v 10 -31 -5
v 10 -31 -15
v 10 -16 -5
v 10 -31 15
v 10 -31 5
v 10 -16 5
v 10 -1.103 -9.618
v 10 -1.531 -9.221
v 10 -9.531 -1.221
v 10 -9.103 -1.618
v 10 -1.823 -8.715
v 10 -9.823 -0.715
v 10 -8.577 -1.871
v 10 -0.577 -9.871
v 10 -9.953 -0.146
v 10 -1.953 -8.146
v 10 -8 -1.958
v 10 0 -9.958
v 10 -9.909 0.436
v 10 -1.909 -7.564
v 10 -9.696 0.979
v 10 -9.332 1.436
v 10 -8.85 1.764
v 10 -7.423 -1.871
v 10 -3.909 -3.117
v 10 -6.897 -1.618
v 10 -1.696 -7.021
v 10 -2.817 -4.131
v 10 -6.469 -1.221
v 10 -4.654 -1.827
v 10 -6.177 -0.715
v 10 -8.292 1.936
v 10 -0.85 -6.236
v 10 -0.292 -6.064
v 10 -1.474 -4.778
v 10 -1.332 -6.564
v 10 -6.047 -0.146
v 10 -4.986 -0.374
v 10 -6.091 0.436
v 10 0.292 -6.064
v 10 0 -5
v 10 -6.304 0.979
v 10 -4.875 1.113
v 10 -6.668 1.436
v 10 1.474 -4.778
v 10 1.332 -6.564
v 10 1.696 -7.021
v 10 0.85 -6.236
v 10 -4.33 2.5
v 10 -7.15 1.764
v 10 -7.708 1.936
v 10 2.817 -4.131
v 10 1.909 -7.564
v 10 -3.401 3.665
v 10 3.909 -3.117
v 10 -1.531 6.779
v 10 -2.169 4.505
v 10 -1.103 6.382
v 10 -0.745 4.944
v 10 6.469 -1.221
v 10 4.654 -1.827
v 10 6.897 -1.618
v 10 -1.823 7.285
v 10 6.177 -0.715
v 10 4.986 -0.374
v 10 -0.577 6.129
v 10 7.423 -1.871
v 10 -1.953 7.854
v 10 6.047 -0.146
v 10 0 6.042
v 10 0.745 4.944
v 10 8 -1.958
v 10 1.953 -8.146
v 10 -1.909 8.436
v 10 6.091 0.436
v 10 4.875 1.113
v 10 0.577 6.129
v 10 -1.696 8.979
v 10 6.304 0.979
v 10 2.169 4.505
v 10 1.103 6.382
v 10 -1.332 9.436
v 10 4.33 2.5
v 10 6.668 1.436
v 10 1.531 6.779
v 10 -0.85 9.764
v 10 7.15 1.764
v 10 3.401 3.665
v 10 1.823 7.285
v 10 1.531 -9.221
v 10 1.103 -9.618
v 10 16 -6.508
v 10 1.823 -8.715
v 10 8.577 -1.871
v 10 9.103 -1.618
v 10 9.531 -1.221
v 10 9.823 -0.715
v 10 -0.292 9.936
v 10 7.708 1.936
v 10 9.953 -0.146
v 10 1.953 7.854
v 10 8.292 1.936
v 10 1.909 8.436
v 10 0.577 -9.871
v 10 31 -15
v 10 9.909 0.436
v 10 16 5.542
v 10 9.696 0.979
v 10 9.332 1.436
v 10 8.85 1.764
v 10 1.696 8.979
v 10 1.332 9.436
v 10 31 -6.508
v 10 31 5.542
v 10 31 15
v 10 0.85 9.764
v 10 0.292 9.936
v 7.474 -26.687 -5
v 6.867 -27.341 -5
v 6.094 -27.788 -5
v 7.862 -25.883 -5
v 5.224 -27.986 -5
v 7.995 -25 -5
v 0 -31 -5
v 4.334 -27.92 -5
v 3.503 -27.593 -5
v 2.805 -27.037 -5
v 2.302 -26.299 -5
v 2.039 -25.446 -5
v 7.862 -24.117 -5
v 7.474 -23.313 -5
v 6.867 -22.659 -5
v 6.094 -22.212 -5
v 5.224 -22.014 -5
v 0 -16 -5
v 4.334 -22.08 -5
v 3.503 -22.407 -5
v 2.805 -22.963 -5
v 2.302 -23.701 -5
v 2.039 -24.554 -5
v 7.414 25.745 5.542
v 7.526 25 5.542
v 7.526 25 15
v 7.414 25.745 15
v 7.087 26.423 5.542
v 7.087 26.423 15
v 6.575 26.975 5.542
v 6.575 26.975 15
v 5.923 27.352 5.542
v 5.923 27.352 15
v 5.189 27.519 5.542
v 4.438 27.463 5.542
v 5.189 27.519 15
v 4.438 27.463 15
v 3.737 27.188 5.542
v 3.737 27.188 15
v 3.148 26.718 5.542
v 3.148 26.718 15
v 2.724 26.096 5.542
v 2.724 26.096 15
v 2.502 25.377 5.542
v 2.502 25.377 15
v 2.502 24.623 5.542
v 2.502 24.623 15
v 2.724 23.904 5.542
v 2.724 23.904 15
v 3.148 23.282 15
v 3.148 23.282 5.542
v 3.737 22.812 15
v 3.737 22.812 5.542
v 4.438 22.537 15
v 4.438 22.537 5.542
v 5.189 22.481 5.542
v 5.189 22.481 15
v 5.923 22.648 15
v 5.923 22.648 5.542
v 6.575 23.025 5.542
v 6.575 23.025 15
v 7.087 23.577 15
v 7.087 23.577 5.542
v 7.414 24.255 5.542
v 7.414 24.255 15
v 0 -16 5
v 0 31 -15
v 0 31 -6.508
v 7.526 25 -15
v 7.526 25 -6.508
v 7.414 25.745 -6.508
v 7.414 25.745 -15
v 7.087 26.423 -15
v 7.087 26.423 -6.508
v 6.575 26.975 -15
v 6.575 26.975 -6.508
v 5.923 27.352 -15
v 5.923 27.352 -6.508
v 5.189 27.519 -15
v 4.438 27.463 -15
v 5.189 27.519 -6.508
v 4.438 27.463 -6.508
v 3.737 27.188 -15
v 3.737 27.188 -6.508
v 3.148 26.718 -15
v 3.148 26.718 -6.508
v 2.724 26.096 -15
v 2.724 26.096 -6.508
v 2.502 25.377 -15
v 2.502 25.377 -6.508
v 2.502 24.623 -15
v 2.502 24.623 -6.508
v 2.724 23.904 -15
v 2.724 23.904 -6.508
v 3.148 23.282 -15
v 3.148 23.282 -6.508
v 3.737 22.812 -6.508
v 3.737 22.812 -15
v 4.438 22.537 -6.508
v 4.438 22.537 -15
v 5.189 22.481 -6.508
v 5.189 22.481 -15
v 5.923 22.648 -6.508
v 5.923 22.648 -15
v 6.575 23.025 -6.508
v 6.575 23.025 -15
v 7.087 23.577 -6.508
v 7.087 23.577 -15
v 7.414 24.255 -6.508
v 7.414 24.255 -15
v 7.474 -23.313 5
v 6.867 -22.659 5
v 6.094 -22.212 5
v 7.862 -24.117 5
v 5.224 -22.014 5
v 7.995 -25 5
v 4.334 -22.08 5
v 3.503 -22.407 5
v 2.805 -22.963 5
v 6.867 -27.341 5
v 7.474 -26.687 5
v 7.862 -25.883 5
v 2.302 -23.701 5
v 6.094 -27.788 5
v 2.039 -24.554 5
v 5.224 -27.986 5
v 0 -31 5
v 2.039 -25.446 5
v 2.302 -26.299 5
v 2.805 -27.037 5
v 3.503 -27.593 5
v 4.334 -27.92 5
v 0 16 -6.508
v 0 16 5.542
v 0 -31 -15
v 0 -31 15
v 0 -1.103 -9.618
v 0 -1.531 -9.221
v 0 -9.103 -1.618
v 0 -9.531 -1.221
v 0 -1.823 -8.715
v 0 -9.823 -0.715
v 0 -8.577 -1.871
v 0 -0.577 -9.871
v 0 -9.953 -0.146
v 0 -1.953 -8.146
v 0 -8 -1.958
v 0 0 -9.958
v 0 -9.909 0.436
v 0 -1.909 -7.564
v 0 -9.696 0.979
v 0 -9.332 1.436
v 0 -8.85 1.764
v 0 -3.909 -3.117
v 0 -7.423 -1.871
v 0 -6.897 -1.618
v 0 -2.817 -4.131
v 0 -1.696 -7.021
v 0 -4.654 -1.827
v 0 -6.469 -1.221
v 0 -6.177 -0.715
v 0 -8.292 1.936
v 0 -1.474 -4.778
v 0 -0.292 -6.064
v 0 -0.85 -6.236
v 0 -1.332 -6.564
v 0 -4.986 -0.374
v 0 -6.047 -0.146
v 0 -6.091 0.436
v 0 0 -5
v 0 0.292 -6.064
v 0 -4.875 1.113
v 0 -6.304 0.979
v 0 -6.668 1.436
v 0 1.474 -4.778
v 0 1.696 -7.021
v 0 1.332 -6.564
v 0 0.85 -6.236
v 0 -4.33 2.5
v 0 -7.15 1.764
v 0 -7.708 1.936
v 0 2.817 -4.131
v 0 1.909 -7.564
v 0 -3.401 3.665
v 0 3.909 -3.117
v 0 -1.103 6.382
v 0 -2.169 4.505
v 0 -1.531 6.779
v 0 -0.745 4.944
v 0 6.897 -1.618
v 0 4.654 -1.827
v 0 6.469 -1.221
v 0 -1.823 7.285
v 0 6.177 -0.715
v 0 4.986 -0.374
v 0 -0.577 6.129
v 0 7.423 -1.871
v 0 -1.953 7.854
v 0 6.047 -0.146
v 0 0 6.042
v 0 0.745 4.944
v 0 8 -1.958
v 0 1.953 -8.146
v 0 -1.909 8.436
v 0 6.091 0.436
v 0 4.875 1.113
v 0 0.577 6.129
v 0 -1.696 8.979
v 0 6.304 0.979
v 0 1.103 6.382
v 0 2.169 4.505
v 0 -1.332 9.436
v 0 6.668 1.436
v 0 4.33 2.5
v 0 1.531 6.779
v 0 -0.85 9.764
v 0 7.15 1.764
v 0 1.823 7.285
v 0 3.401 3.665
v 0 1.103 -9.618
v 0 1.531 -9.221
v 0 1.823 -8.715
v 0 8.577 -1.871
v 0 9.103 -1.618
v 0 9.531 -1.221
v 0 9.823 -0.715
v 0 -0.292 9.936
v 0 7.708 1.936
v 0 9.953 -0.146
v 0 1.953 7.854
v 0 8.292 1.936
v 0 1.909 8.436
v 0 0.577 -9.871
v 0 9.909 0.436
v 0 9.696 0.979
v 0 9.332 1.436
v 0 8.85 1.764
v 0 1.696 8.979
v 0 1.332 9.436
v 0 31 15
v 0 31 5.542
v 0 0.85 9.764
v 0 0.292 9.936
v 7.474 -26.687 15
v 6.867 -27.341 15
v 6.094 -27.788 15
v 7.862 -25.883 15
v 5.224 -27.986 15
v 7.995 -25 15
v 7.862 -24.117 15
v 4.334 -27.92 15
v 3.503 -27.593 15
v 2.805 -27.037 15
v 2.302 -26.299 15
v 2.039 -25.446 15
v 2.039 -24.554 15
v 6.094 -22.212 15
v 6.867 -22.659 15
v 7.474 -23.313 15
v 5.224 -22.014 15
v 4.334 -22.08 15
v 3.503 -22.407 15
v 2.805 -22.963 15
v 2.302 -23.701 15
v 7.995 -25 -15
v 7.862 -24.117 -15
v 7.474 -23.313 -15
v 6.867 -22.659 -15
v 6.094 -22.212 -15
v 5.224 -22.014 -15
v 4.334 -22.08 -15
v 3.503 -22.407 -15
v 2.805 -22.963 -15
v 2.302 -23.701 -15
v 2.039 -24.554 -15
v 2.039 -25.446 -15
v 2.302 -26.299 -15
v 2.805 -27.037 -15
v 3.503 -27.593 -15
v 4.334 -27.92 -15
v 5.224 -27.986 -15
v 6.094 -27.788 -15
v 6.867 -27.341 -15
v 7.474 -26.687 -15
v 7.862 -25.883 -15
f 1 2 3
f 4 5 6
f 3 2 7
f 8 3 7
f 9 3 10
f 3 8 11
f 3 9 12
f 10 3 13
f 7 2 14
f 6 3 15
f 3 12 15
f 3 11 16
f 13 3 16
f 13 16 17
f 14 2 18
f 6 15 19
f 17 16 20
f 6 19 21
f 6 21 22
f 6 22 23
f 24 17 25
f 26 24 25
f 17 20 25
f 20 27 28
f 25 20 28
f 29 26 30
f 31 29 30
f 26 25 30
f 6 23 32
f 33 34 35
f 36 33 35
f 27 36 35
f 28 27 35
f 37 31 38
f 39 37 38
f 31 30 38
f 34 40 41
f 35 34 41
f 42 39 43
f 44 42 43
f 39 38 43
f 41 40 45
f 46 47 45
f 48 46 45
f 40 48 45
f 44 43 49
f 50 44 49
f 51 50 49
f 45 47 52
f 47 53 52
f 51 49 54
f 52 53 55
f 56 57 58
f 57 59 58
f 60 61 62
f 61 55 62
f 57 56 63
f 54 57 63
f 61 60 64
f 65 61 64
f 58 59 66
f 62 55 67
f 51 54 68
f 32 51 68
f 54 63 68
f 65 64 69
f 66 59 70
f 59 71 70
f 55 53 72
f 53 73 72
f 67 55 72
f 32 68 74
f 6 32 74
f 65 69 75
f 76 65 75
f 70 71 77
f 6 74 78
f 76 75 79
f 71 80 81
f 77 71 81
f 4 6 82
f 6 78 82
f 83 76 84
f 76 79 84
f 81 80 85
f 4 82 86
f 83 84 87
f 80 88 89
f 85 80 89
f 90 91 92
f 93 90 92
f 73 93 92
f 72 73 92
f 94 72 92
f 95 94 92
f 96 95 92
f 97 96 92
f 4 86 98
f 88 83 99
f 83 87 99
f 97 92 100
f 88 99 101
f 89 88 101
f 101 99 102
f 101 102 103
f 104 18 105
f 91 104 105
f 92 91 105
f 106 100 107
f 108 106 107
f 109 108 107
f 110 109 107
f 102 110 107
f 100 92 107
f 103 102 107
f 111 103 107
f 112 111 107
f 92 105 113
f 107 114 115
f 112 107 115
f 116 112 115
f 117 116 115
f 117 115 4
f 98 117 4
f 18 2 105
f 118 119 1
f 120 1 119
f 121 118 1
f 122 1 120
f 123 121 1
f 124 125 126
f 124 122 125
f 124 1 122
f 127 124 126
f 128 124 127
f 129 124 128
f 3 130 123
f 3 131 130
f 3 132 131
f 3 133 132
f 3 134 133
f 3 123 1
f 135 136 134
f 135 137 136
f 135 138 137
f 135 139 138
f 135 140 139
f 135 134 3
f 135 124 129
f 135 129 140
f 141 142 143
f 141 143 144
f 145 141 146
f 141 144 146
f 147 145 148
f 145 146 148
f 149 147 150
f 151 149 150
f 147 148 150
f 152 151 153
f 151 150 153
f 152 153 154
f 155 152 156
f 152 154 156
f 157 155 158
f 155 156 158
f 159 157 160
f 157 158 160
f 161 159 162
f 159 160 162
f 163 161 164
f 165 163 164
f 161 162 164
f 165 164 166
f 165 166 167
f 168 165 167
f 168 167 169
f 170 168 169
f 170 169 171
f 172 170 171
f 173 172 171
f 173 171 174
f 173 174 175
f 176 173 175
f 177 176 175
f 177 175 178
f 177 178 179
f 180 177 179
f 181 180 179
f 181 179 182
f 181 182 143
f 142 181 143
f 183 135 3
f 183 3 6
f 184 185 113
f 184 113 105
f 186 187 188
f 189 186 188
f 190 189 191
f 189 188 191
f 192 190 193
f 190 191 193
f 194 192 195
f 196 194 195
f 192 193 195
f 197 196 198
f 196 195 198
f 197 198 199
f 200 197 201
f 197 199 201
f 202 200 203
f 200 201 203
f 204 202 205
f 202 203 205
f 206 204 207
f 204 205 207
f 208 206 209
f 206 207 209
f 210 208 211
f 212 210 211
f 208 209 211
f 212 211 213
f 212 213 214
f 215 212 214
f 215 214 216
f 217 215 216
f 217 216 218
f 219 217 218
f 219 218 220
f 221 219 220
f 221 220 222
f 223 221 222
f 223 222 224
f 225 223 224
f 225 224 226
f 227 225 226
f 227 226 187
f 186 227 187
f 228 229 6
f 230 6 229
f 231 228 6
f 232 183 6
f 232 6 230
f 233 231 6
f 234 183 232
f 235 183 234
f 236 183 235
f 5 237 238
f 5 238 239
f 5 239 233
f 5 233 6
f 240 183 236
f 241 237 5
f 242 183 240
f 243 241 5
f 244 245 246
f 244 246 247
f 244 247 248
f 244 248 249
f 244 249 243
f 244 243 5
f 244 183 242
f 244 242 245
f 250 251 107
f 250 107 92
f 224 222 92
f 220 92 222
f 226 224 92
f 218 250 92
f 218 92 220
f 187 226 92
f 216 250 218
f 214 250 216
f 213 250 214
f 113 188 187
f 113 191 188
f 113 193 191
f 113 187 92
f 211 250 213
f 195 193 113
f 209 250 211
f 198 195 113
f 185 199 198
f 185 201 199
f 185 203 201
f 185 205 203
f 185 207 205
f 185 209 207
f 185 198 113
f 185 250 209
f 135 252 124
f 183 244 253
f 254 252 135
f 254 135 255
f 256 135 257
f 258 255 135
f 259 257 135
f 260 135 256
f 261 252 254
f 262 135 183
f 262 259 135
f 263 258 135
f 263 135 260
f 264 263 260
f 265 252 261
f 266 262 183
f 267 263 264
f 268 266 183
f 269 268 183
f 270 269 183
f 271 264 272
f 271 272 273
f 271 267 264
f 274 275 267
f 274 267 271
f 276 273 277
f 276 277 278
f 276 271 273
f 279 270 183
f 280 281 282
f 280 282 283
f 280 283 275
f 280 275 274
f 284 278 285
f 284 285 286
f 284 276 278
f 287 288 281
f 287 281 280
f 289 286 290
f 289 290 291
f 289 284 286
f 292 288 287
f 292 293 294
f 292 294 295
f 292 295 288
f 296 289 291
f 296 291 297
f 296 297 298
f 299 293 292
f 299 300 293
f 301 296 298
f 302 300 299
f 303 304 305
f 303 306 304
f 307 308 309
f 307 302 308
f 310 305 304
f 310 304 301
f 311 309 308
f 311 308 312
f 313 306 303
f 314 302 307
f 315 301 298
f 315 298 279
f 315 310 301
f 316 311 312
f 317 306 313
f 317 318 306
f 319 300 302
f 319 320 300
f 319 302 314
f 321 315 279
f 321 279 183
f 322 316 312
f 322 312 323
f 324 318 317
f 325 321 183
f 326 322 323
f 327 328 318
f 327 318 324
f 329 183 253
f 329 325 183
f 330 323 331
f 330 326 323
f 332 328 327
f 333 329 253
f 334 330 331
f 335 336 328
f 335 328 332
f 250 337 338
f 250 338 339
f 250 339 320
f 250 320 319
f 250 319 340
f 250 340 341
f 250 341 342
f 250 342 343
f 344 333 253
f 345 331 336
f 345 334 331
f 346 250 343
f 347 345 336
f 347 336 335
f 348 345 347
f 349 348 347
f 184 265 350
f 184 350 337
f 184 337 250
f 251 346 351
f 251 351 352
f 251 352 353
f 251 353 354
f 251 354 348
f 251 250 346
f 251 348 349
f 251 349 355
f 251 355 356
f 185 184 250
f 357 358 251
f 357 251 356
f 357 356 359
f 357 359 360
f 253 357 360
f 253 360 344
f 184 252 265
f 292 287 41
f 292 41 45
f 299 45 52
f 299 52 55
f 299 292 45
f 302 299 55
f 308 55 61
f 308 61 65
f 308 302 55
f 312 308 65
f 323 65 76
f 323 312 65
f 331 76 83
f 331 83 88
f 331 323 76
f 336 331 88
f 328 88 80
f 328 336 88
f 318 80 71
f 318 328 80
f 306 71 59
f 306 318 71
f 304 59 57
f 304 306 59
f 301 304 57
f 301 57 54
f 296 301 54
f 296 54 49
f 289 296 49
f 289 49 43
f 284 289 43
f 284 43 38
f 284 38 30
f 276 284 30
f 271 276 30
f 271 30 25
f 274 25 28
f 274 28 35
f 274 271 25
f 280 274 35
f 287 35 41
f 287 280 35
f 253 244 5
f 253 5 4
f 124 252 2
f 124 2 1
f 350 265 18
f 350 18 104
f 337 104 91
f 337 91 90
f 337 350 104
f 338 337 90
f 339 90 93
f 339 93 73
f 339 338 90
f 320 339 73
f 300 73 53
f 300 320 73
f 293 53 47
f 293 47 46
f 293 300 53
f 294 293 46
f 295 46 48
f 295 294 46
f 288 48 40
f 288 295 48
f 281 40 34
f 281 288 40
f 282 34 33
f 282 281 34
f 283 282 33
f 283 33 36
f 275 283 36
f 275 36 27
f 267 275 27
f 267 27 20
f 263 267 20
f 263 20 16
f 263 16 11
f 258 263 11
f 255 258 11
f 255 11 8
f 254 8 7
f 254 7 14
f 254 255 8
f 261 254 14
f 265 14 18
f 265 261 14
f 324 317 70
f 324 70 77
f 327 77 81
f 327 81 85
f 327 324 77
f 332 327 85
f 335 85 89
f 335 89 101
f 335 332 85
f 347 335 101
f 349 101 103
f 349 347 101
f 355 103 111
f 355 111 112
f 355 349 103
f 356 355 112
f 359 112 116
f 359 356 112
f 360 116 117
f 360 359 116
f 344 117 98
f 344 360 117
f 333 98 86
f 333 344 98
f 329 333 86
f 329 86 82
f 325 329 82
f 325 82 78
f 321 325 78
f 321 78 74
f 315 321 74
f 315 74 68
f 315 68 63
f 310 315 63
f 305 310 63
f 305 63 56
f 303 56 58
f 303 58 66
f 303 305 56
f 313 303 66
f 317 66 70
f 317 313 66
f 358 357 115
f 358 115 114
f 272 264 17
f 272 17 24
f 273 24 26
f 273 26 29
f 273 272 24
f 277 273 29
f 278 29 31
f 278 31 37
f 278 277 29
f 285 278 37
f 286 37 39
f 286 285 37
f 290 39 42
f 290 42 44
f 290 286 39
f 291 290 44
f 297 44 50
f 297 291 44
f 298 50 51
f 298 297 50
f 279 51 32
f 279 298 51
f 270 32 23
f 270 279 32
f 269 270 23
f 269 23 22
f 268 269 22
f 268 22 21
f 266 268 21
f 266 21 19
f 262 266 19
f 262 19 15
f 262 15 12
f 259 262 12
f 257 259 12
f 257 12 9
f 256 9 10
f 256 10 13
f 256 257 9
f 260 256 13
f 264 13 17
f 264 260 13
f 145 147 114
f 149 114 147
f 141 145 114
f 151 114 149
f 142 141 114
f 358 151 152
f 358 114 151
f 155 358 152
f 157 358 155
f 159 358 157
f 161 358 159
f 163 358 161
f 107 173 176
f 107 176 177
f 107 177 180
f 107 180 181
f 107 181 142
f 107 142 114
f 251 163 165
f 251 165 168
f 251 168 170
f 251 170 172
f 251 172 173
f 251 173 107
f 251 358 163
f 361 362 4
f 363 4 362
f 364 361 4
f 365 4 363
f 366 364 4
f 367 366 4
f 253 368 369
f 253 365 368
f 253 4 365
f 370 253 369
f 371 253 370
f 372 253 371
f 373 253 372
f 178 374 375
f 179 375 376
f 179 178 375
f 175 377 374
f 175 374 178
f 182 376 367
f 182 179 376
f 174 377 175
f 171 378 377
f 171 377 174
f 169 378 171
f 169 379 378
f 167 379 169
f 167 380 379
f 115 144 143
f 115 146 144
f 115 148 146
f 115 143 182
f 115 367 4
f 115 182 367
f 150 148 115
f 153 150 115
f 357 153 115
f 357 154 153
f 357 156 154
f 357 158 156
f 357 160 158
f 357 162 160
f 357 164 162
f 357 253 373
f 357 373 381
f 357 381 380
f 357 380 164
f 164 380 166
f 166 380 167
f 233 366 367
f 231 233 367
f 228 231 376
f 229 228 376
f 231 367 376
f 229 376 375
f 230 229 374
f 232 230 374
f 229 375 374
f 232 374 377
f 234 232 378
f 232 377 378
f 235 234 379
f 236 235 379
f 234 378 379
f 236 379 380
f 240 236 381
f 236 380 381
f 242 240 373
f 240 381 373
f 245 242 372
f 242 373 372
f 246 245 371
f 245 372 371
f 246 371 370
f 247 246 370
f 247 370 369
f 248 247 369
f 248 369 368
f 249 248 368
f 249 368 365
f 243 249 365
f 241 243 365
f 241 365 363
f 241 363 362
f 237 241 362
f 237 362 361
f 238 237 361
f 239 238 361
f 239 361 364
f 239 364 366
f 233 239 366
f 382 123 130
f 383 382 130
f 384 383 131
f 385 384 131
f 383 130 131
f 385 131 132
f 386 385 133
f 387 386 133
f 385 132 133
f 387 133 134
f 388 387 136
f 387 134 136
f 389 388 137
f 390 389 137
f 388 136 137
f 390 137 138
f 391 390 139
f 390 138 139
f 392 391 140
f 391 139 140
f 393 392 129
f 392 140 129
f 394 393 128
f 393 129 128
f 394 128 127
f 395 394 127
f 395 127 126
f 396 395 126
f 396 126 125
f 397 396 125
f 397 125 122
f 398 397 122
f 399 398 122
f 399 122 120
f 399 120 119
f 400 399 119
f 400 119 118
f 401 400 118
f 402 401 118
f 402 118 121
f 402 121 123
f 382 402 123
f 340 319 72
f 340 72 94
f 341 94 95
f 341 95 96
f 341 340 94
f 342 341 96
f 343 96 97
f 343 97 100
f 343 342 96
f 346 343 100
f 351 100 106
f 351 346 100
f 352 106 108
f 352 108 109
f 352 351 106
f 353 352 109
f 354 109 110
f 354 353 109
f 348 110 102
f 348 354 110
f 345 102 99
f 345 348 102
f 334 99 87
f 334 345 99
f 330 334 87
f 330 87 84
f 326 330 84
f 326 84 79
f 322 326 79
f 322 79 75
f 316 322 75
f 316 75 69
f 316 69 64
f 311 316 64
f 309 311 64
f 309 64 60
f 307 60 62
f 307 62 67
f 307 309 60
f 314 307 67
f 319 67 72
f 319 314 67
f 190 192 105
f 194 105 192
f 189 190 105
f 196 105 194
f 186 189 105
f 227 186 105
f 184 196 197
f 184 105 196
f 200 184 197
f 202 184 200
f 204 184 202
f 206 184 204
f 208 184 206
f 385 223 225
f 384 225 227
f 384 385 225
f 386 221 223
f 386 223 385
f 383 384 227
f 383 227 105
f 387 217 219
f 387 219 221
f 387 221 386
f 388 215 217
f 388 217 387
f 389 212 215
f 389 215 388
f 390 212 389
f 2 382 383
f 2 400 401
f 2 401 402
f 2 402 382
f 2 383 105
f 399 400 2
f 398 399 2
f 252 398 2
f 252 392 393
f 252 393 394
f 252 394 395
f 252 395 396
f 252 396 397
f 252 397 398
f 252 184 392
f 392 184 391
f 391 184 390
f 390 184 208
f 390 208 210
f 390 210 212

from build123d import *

# Parameters (mm, degrees)
CROQUIS1_R              = 5
CROQUIS1_R_2            = 1.95828143
SALIENTE_EXTRUIR1_DEPTH = 10
CROQUIS2_R              = 2.526447491
CROQUIS2_R_2            = 2.994638929
CORTAR_EXTRUIR1_DEPTH   = 45.283179651


with BuildPart() as part:
    # Croquis1 → Saliente-Extruir1 (new body)
    with BuildSketch(Plane(origin=(0, 0, 0), x_dir=(0, 0, -1), z_dir=(1, 0, 0))):
        Polygon((15, -31), (5, -31), (5, -16), (-5, -16), (-5, -31), (-15, -31), (-15, 31), (-5.542055275, 31), (-5.542055275, 16), (6.50834207, 16), (6.50834207, 31), (15, 31), align=None)
        Circle(CROQUIS1_R, mode=Mode.SUBTRACT)
        with Locations((-8, 0)):
            Circle(CROQUIS1_R_2, mode=Mode.SUBTRACT)
        with Locations((0, 8)):
            Circle(CROQUIS1_R_2, mode=Mode.SUBTRACT)
        with Locations((8, 0)):
            Circle(CROQUIS1_R_2, mode=Mode.SUBTRACT)
        with Locations((0, -8)):
            Circle(CROQUIS1_R_2, mode=Mode.SUBTRACT)
    extrude(amount=SALIENTE_EXTRUIR1_DEPTH)

    # Croquis2 → Cortar-Extruir1 (cut, through all)
    with BuildSketch(Plane.XY.offset(15)):
        with Locations((5, 25)):
            Circle(CROQUIS2_R)
        with Locations((5, -25)):
            Circle(CROQUIS2_R_2)
    extrude(amount=-CORTAR_EXTRUIR1_DEPTH, mode=Mode.SUBTRACT)


solid = part.part
